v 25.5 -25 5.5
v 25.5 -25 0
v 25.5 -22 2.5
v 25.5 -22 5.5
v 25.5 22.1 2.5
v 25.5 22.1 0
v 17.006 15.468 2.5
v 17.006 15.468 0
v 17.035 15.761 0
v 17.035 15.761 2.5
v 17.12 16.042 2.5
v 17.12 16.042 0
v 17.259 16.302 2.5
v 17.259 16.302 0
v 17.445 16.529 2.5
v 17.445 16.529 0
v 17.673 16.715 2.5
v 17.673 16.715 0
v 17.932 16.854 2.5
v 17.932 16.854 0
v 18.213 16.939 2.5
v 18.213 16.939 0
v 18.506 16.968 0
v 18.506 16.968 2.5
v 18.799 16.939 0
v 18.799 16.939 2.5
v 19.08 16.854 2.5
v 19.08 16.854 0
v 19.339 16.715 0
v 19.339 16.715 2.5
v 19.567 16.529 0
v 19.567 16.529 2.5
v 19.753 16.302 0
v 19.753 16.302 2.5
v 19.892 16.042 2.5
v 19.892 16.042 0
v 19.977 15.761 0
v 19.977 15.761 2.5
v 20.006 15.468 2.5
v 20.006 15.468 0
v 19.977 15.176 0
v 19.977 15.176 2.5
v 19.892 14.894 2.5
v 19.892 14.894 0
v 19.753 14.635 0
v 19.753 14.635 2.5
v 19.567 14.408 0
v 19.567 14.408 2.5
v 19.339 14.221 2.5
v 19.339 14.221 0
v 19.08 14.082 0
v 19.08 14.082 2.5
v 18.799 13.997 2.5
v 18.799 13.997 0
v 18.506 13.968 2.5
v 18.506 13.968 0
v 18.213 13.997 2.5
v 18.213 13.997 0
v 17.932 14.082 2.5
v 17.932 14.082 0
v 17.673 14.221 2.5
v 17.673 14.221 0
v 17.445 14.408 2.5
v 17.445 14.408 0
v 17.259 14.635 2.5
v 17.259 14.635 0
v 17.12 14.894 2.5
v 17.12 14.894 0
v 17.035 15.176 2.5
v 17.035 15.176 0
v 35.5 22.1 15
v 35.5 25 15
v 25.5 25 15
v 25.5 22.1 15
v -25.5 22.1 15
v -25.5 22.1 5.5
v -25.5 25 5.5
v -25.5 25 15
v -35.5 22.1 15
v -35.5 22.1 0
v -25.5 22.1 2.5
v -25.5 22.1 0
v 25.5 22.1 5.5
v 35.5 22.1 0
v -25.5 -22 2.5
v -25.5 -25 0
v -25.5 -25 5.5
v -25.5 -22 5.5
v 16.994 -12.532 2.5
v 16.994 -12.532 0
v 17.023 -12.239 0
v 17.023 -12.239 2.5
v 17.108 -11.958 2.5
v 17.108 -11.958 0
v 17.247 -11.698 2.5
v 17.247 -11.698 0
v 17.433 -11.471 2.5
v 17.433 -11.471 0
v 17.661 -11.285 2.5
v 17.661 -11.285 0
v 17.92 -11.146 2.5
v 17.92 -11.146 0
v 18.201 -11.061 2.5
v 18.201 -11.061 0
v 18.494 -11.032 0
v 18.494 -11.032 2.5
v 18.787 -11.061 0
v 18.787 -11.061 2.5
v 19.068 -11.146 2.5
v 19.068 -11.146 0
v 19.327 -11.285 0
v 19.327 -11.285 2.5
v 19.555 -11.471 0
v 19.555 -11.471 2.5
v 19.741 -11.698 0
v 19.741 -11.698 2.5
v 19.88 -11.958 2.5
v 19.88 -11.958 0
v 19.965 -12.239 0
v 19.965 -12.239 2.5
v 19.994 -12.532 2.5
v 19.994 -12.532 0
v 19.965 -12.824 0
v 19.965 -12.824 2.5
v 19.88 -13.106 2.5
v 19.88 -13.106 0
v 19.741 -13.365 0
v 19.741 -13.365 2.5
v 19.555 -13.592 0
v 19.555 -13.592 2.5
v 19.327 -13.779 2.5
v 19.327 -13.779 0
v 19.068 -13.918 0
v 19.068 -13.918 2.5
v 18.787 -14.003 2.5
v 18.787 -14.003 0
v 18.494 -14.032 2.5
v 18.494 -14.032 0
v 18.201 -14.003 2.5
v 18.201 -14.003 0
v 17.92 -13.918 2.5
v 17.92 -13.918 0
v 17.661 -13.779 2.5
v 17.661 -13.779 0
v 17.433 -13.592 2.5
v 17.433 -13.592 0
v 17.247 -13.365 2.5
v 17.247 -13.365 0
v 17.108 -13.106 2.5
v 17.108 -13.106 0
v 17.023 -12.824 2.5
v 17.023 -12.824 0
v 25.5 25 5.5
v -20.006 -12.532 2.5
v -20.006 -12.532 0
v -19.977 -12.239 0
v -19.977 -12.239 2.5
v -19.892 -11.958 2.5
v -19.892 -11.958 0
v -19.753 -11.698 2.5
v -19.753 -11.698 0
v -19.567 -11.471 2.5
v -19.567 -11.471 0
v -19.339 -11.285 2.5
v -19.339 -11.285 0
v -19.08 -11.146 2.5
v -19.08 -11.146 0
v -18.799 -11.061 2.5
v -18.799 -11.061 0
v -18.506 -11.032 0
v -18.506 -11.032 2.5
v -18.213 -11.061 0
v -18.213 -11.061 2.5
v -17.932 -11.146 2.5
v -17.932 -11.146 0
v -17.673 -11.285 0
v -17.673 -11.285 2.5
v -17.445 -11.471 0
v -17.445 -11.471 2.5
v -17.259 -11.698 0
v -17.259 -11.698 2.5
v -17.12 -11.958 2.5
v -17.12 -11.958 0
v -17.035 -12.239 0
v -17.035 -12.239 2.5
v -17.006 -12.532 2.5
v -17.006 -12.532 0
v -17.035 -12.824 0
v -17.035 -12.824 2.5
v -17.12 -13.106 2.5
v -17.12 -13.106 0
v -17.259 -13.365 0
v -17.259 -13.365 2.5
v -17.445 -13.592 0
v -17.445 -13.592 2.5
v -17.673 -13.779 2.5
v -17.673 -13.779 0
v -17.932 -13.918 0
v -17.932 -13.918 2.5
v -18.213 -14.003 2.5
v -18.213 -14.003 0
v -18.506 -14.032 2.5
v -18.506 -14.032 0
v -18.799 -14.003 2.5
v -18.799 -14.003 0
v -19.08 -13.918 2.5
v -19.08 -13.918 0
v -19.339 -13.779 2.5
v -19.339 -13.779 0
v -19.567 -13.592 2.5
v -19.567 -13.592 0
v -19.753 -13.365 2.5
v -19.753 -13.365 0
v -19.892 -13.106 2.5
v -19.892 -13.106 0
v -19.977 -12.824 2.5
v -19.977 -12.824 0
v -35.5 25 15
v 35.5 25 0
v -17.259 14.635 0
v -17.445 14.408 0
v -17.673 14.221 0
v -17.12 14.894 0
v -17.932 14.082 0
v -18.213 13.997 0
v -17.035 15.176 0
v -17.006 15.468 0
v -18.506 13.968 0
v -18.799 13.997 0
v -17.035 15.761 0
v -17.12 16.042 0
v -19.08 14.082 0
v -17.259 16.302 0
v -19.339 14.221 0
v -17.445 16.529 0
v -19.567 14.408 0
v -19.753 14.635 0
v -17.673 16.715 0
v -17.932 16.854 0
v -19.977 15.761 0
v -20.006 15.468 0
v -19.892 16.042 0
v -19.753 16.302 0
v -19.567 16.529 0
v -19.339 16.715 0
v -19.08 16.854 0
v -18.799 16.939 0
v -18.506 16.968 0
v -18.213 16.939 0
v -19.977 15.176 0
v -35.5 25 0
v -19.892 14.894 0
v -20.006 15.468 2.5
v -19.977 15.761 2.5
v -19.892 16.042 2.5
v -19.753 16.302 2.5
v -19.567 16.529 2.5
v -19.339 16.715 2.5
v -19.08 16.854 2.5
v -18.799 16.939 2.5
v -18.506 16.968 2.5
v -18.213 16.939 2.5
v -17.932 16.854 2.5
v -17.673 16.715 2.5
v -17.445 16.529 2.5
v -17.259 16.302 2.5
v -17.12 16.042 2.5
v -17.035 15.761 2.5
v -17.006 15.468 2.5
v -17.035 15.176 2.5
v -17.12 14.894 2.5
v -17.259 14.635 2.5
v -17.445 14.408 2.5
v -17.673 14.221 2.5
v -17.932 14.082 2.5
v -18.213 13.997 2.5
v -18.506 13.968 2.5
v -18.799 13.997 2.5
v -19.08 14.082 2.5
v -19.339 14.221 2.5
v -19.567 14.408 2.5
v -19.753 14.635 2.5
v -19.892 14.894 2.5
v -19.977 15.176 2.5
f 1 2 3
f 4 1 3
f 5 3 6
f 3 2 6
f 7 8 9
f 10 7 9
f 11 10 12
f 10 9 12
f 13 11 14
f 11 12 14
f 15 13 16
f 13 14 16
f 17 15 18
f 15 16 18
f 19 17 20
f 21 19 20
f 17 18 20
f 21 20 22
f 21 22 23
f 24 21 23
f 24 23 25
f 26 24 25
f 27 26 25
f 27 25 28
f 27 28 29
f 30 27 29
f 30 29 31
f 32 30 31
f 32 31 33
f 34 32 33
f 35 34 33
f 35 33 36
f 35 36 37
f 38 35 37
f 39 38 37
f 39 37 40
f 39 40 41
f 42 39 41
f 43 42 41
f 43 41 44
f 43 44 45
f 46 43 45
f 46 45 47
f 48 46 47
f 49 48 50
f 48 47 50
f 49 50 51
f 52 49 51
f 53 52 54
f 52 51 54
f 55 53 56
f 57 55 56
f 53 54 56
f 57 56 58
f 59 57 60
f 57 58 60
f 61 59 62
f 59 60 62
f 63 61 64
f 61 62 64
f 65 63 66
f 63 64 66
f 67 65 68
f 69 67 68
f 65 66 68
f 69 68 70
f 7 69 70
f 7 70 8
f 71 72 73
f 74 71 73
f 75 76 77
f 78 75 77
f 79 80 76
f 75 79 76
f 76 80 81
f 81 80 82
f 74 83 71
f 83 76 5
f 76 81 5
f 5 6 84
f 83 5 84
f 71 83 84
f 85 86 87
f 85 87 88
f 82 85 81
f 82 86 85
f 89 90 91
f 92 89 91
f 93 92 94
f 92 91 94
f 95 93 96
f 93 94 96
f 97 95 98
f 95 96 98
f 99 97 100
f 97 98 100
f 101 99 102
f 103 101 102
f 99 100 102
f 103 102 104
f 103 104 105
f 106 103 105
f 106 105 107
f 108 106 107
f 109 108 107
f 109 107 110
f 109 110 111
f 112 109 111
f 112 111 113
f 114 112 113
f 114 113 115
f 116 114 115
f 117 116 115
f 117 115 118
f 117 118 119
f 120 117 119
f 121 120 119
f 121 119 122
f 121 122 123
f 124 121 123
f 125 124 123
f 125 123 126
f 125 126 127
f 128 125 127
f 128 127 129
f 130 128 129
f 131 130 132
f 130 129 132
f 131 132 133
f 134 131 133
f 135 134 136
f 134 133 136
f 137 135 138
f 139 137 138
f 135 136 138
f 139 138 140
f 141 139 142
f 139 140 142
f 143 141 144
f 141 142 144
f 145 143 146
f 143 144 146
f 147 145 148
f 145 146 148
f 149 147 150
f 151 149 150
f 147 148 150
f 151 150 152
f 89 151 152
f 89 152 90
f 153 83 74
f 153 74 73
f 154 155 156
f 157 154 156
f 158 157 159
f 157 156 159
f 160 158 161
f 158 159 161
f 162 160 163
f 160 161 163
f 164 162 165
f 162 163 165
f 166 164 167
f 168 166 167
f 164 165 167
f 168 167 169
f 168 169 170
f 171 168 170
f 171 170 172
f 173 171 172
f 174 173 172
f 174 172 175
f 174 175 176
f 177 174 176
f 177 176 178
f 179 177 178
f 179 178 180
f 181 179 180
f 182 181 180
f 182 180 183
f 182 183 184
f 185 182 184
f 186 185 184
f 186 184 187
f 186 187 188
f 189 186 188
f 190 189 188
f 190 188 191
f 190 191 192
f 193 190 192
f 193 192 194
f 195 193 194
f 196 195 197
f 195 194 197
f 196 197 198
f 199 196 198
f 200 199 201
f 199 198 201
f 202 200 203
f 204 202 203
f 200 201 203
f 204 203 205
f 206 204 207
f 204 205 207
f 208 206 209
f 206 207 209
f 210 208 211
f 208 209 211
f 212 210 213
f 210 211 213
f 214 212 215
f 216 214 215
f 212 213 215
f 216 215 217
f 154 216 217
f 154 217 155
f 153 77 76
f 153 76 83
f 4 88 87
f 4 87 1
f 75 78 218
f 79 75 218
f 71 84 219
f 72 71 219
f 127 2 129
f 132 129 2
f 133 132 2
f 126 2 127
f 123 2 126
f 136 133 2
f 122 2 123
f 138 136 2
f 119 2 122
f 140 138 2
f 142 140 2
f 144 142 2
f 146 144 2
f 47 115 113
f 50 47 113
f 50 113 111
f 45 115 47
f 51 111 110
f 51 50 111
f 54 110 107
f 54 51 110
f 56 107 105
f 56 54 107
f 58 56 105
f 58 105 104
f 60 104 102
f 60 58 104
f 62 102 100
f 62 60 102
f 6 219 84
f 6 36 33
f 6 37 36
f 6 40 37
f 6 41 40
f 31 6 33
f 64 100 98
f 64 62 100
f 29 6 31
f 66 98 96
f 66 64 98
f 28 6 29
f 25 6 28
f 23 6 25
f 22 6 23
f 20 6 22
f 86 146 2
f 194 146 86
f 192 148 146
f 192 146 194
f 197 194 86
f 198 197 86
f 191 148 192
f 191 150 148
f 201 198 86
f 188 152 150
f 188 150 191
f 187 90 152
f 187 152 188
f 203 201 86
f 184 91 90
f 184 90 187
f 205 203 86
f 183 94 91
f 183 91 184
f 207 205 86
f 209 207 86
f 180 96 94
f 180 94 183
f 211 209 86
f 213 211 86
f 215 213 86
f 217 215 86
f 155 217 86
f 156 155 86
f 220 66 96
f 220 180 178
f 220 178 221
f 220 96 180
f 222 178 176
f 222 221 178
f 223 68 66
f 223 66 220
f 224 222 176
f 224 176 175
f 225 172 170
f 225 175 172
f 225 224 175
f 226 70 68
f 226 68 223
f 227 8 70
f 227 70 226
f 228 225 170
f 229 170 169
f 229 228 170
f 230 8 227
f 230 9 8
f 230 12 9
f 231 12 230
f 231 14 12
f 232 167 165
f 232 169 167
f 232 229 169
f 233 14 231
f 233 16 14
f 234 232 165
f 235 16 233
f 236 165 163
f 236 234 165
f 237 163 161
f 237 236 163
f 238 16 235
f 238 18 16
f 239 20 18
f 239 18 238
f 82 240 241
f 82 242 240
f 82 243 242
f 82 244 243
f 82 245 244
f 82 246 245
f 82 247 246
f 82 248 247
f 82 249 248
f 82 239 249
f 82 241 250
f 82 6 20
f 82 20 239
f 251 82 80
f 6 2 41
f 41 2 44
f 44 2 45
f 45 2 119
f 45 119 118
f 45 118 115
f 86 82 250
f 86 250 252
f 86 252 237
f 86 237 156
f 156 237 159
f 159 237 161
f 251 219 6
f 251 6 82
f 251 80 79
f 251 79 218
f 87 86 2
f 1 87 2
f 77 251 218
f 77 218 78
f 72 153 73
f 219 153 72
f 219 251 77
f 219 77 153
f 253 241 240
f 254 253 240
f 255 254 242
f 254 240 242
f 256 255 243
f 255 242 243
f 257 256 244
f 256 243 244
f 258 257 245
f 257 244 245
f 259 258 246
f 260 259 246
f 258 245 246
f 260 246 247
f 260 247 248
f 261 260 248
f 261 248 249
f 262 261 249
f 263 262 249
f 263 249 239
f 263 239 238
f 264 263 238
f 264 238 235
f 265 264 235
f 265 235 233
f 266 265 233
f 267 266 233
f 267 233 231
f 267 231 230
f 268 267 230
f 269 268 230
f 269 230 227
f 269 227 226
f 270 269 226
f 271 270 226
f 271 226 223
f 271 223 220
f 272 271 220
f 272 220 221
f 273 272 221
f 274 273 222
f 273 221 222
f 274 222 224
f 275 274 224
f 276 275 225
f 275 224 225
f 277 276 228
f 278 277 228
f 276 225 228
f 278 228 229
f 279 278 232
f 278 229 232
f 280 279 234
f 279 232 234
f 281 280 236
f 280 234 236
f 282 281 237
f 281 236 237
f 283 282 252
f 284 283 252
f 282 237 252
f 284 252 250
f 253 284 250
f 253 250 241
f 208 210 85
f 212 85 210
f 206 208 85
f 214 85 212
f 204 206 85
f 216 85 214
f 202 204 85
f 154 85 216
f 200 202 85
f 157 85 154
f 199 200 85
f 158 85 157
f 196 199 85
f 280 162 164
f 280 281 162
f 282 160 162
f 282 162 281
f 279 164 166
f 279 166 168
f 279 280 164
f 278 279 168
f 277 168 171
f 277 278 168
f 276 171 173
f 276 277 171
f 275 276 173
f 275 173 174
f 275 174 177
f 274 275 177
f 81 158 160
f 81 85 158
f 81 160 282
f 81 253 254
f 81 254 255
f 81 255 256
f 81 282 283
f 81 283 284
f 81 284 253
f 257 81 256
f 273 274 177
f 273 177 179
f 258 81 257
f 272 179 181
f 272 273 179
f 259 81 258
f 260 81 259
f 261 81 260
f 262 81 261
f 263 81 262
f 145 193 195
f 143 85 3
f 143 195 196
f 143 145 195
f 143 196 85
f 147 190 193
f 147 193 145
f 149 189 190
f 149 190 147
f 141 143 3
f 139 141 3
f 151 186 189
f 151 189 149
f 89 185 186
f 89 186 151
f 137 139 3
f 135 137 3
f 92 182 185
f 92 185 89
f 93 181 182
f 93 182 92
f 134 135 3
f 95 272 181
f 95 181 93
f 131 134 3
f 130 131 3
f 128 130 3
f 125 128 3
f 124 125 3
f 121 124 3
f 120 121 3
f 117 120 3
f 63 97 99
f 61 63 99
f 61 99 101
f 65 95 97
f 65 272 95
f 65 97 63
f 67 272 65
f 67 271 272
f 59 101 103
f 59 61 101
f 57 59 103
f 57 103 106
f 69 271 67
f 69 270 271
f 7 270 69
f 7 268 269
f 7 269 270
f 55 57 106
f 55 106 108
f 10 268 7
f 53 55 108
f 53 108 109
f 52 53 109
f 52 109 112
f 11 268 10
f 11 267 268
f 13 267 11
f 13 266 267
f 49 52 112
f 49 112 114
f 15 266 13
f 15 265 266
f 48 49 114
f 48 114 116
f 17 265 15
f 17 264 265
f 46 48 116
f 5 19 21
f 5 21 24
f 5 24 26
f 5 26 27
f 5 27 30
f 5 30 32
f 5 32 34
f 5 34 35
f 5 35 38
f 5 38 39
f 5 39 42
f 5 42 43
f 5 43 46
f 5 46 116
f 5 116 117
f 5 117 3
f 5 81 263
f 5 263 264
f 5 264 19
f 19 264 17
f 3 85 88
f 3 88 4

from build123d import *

# Parameters (mm, degrees)
ESQUISSE1_W             = 51
ESQUISSE1_H             = 50
BOSS_EXTRU_1_DEPTH      = 2.5
ESQUISSE2_W             = 10
ESQUISSE2_H             = 2.9
BOSS_EXTRU_2_DEPTH      = 15
ESQUISSE3_W             = 51
ESQUISSE3_H             = 2.9
ESQUISSE3_H_2           = 3
BOSS_EXTRU_3_DEPTH      = 3
ESQUISSE4_R             = 1.5
ENL_V_MAT_EXTRU_1_DEPTH = 46.937457483


with BuildPart() as part:
    # Esquisse1 → Boss.-Extru.1 (new body)
    with BuildSketch(Plane.XY):
        Rectangle(ESQUISSE1_W, ESQUISSE1_H)
    extrude(amount=BOSS_EXTRU_1_DEPTH)

    # Esquisse2 → Boss.-Extru.2 (add)
    with BuildSketch(Plane(origin=(0, 0, 0), x_dir=(-1, 0, 0), z_dir=(0, 0, -1))):
        with Locations((-30.5, 23.55)):
            Rectangle(ESQUISSE2_W, ESQUISSE2_H)
        with Locations((30.5, 23.55)):
            Rectangle(ESQUISSE2_W, ESQUISSE2_H)
    extrude(amount=-BOSS_EXTRU_2_DEPTH)

    # Esquisse3 → Boss.-Extru.3 (add)
    with BuildSketch(Plane.XY.offset(2.5)):
        with Locations((0, 23.55)):
            Rectangle(ESQUISSE3_W, ESQUISSE3_H)
        with Locations((0, -23.5)):
            Rectangle(ESQUISSE3_W, ESQUISSE3_H_2)
    extrude(amount=BOSS_EXTRU_3_DEPTH)

    # Esquisse4 → Enlèv. mat.-Extru.1 (cut, through all)
    with BuildSketch(Plane(origin=(0, 0, 0), x_dir=(-1, 0, 0), z_dir=(0, 0, -1))):
        with Locations((18.506042036, -12.531837257)):
            Circle(ESQUISSE4_R)
        with Locations((-18.493956712, -12.531832115)):
            Circle(ESQUISSE4_R)
        with Locations((-18.505955671, 15.468170274)):
            Circle(ESQUISSE4_R)
        with Locations((18.506042036, 15.468170274)):
            Circle(ESQUISSE4_R)
    extrude(amount=-ENL_V_MAT_EXTRU_1_DEPTH, mode=Mode.SUBTRACT)


solid = part.part
